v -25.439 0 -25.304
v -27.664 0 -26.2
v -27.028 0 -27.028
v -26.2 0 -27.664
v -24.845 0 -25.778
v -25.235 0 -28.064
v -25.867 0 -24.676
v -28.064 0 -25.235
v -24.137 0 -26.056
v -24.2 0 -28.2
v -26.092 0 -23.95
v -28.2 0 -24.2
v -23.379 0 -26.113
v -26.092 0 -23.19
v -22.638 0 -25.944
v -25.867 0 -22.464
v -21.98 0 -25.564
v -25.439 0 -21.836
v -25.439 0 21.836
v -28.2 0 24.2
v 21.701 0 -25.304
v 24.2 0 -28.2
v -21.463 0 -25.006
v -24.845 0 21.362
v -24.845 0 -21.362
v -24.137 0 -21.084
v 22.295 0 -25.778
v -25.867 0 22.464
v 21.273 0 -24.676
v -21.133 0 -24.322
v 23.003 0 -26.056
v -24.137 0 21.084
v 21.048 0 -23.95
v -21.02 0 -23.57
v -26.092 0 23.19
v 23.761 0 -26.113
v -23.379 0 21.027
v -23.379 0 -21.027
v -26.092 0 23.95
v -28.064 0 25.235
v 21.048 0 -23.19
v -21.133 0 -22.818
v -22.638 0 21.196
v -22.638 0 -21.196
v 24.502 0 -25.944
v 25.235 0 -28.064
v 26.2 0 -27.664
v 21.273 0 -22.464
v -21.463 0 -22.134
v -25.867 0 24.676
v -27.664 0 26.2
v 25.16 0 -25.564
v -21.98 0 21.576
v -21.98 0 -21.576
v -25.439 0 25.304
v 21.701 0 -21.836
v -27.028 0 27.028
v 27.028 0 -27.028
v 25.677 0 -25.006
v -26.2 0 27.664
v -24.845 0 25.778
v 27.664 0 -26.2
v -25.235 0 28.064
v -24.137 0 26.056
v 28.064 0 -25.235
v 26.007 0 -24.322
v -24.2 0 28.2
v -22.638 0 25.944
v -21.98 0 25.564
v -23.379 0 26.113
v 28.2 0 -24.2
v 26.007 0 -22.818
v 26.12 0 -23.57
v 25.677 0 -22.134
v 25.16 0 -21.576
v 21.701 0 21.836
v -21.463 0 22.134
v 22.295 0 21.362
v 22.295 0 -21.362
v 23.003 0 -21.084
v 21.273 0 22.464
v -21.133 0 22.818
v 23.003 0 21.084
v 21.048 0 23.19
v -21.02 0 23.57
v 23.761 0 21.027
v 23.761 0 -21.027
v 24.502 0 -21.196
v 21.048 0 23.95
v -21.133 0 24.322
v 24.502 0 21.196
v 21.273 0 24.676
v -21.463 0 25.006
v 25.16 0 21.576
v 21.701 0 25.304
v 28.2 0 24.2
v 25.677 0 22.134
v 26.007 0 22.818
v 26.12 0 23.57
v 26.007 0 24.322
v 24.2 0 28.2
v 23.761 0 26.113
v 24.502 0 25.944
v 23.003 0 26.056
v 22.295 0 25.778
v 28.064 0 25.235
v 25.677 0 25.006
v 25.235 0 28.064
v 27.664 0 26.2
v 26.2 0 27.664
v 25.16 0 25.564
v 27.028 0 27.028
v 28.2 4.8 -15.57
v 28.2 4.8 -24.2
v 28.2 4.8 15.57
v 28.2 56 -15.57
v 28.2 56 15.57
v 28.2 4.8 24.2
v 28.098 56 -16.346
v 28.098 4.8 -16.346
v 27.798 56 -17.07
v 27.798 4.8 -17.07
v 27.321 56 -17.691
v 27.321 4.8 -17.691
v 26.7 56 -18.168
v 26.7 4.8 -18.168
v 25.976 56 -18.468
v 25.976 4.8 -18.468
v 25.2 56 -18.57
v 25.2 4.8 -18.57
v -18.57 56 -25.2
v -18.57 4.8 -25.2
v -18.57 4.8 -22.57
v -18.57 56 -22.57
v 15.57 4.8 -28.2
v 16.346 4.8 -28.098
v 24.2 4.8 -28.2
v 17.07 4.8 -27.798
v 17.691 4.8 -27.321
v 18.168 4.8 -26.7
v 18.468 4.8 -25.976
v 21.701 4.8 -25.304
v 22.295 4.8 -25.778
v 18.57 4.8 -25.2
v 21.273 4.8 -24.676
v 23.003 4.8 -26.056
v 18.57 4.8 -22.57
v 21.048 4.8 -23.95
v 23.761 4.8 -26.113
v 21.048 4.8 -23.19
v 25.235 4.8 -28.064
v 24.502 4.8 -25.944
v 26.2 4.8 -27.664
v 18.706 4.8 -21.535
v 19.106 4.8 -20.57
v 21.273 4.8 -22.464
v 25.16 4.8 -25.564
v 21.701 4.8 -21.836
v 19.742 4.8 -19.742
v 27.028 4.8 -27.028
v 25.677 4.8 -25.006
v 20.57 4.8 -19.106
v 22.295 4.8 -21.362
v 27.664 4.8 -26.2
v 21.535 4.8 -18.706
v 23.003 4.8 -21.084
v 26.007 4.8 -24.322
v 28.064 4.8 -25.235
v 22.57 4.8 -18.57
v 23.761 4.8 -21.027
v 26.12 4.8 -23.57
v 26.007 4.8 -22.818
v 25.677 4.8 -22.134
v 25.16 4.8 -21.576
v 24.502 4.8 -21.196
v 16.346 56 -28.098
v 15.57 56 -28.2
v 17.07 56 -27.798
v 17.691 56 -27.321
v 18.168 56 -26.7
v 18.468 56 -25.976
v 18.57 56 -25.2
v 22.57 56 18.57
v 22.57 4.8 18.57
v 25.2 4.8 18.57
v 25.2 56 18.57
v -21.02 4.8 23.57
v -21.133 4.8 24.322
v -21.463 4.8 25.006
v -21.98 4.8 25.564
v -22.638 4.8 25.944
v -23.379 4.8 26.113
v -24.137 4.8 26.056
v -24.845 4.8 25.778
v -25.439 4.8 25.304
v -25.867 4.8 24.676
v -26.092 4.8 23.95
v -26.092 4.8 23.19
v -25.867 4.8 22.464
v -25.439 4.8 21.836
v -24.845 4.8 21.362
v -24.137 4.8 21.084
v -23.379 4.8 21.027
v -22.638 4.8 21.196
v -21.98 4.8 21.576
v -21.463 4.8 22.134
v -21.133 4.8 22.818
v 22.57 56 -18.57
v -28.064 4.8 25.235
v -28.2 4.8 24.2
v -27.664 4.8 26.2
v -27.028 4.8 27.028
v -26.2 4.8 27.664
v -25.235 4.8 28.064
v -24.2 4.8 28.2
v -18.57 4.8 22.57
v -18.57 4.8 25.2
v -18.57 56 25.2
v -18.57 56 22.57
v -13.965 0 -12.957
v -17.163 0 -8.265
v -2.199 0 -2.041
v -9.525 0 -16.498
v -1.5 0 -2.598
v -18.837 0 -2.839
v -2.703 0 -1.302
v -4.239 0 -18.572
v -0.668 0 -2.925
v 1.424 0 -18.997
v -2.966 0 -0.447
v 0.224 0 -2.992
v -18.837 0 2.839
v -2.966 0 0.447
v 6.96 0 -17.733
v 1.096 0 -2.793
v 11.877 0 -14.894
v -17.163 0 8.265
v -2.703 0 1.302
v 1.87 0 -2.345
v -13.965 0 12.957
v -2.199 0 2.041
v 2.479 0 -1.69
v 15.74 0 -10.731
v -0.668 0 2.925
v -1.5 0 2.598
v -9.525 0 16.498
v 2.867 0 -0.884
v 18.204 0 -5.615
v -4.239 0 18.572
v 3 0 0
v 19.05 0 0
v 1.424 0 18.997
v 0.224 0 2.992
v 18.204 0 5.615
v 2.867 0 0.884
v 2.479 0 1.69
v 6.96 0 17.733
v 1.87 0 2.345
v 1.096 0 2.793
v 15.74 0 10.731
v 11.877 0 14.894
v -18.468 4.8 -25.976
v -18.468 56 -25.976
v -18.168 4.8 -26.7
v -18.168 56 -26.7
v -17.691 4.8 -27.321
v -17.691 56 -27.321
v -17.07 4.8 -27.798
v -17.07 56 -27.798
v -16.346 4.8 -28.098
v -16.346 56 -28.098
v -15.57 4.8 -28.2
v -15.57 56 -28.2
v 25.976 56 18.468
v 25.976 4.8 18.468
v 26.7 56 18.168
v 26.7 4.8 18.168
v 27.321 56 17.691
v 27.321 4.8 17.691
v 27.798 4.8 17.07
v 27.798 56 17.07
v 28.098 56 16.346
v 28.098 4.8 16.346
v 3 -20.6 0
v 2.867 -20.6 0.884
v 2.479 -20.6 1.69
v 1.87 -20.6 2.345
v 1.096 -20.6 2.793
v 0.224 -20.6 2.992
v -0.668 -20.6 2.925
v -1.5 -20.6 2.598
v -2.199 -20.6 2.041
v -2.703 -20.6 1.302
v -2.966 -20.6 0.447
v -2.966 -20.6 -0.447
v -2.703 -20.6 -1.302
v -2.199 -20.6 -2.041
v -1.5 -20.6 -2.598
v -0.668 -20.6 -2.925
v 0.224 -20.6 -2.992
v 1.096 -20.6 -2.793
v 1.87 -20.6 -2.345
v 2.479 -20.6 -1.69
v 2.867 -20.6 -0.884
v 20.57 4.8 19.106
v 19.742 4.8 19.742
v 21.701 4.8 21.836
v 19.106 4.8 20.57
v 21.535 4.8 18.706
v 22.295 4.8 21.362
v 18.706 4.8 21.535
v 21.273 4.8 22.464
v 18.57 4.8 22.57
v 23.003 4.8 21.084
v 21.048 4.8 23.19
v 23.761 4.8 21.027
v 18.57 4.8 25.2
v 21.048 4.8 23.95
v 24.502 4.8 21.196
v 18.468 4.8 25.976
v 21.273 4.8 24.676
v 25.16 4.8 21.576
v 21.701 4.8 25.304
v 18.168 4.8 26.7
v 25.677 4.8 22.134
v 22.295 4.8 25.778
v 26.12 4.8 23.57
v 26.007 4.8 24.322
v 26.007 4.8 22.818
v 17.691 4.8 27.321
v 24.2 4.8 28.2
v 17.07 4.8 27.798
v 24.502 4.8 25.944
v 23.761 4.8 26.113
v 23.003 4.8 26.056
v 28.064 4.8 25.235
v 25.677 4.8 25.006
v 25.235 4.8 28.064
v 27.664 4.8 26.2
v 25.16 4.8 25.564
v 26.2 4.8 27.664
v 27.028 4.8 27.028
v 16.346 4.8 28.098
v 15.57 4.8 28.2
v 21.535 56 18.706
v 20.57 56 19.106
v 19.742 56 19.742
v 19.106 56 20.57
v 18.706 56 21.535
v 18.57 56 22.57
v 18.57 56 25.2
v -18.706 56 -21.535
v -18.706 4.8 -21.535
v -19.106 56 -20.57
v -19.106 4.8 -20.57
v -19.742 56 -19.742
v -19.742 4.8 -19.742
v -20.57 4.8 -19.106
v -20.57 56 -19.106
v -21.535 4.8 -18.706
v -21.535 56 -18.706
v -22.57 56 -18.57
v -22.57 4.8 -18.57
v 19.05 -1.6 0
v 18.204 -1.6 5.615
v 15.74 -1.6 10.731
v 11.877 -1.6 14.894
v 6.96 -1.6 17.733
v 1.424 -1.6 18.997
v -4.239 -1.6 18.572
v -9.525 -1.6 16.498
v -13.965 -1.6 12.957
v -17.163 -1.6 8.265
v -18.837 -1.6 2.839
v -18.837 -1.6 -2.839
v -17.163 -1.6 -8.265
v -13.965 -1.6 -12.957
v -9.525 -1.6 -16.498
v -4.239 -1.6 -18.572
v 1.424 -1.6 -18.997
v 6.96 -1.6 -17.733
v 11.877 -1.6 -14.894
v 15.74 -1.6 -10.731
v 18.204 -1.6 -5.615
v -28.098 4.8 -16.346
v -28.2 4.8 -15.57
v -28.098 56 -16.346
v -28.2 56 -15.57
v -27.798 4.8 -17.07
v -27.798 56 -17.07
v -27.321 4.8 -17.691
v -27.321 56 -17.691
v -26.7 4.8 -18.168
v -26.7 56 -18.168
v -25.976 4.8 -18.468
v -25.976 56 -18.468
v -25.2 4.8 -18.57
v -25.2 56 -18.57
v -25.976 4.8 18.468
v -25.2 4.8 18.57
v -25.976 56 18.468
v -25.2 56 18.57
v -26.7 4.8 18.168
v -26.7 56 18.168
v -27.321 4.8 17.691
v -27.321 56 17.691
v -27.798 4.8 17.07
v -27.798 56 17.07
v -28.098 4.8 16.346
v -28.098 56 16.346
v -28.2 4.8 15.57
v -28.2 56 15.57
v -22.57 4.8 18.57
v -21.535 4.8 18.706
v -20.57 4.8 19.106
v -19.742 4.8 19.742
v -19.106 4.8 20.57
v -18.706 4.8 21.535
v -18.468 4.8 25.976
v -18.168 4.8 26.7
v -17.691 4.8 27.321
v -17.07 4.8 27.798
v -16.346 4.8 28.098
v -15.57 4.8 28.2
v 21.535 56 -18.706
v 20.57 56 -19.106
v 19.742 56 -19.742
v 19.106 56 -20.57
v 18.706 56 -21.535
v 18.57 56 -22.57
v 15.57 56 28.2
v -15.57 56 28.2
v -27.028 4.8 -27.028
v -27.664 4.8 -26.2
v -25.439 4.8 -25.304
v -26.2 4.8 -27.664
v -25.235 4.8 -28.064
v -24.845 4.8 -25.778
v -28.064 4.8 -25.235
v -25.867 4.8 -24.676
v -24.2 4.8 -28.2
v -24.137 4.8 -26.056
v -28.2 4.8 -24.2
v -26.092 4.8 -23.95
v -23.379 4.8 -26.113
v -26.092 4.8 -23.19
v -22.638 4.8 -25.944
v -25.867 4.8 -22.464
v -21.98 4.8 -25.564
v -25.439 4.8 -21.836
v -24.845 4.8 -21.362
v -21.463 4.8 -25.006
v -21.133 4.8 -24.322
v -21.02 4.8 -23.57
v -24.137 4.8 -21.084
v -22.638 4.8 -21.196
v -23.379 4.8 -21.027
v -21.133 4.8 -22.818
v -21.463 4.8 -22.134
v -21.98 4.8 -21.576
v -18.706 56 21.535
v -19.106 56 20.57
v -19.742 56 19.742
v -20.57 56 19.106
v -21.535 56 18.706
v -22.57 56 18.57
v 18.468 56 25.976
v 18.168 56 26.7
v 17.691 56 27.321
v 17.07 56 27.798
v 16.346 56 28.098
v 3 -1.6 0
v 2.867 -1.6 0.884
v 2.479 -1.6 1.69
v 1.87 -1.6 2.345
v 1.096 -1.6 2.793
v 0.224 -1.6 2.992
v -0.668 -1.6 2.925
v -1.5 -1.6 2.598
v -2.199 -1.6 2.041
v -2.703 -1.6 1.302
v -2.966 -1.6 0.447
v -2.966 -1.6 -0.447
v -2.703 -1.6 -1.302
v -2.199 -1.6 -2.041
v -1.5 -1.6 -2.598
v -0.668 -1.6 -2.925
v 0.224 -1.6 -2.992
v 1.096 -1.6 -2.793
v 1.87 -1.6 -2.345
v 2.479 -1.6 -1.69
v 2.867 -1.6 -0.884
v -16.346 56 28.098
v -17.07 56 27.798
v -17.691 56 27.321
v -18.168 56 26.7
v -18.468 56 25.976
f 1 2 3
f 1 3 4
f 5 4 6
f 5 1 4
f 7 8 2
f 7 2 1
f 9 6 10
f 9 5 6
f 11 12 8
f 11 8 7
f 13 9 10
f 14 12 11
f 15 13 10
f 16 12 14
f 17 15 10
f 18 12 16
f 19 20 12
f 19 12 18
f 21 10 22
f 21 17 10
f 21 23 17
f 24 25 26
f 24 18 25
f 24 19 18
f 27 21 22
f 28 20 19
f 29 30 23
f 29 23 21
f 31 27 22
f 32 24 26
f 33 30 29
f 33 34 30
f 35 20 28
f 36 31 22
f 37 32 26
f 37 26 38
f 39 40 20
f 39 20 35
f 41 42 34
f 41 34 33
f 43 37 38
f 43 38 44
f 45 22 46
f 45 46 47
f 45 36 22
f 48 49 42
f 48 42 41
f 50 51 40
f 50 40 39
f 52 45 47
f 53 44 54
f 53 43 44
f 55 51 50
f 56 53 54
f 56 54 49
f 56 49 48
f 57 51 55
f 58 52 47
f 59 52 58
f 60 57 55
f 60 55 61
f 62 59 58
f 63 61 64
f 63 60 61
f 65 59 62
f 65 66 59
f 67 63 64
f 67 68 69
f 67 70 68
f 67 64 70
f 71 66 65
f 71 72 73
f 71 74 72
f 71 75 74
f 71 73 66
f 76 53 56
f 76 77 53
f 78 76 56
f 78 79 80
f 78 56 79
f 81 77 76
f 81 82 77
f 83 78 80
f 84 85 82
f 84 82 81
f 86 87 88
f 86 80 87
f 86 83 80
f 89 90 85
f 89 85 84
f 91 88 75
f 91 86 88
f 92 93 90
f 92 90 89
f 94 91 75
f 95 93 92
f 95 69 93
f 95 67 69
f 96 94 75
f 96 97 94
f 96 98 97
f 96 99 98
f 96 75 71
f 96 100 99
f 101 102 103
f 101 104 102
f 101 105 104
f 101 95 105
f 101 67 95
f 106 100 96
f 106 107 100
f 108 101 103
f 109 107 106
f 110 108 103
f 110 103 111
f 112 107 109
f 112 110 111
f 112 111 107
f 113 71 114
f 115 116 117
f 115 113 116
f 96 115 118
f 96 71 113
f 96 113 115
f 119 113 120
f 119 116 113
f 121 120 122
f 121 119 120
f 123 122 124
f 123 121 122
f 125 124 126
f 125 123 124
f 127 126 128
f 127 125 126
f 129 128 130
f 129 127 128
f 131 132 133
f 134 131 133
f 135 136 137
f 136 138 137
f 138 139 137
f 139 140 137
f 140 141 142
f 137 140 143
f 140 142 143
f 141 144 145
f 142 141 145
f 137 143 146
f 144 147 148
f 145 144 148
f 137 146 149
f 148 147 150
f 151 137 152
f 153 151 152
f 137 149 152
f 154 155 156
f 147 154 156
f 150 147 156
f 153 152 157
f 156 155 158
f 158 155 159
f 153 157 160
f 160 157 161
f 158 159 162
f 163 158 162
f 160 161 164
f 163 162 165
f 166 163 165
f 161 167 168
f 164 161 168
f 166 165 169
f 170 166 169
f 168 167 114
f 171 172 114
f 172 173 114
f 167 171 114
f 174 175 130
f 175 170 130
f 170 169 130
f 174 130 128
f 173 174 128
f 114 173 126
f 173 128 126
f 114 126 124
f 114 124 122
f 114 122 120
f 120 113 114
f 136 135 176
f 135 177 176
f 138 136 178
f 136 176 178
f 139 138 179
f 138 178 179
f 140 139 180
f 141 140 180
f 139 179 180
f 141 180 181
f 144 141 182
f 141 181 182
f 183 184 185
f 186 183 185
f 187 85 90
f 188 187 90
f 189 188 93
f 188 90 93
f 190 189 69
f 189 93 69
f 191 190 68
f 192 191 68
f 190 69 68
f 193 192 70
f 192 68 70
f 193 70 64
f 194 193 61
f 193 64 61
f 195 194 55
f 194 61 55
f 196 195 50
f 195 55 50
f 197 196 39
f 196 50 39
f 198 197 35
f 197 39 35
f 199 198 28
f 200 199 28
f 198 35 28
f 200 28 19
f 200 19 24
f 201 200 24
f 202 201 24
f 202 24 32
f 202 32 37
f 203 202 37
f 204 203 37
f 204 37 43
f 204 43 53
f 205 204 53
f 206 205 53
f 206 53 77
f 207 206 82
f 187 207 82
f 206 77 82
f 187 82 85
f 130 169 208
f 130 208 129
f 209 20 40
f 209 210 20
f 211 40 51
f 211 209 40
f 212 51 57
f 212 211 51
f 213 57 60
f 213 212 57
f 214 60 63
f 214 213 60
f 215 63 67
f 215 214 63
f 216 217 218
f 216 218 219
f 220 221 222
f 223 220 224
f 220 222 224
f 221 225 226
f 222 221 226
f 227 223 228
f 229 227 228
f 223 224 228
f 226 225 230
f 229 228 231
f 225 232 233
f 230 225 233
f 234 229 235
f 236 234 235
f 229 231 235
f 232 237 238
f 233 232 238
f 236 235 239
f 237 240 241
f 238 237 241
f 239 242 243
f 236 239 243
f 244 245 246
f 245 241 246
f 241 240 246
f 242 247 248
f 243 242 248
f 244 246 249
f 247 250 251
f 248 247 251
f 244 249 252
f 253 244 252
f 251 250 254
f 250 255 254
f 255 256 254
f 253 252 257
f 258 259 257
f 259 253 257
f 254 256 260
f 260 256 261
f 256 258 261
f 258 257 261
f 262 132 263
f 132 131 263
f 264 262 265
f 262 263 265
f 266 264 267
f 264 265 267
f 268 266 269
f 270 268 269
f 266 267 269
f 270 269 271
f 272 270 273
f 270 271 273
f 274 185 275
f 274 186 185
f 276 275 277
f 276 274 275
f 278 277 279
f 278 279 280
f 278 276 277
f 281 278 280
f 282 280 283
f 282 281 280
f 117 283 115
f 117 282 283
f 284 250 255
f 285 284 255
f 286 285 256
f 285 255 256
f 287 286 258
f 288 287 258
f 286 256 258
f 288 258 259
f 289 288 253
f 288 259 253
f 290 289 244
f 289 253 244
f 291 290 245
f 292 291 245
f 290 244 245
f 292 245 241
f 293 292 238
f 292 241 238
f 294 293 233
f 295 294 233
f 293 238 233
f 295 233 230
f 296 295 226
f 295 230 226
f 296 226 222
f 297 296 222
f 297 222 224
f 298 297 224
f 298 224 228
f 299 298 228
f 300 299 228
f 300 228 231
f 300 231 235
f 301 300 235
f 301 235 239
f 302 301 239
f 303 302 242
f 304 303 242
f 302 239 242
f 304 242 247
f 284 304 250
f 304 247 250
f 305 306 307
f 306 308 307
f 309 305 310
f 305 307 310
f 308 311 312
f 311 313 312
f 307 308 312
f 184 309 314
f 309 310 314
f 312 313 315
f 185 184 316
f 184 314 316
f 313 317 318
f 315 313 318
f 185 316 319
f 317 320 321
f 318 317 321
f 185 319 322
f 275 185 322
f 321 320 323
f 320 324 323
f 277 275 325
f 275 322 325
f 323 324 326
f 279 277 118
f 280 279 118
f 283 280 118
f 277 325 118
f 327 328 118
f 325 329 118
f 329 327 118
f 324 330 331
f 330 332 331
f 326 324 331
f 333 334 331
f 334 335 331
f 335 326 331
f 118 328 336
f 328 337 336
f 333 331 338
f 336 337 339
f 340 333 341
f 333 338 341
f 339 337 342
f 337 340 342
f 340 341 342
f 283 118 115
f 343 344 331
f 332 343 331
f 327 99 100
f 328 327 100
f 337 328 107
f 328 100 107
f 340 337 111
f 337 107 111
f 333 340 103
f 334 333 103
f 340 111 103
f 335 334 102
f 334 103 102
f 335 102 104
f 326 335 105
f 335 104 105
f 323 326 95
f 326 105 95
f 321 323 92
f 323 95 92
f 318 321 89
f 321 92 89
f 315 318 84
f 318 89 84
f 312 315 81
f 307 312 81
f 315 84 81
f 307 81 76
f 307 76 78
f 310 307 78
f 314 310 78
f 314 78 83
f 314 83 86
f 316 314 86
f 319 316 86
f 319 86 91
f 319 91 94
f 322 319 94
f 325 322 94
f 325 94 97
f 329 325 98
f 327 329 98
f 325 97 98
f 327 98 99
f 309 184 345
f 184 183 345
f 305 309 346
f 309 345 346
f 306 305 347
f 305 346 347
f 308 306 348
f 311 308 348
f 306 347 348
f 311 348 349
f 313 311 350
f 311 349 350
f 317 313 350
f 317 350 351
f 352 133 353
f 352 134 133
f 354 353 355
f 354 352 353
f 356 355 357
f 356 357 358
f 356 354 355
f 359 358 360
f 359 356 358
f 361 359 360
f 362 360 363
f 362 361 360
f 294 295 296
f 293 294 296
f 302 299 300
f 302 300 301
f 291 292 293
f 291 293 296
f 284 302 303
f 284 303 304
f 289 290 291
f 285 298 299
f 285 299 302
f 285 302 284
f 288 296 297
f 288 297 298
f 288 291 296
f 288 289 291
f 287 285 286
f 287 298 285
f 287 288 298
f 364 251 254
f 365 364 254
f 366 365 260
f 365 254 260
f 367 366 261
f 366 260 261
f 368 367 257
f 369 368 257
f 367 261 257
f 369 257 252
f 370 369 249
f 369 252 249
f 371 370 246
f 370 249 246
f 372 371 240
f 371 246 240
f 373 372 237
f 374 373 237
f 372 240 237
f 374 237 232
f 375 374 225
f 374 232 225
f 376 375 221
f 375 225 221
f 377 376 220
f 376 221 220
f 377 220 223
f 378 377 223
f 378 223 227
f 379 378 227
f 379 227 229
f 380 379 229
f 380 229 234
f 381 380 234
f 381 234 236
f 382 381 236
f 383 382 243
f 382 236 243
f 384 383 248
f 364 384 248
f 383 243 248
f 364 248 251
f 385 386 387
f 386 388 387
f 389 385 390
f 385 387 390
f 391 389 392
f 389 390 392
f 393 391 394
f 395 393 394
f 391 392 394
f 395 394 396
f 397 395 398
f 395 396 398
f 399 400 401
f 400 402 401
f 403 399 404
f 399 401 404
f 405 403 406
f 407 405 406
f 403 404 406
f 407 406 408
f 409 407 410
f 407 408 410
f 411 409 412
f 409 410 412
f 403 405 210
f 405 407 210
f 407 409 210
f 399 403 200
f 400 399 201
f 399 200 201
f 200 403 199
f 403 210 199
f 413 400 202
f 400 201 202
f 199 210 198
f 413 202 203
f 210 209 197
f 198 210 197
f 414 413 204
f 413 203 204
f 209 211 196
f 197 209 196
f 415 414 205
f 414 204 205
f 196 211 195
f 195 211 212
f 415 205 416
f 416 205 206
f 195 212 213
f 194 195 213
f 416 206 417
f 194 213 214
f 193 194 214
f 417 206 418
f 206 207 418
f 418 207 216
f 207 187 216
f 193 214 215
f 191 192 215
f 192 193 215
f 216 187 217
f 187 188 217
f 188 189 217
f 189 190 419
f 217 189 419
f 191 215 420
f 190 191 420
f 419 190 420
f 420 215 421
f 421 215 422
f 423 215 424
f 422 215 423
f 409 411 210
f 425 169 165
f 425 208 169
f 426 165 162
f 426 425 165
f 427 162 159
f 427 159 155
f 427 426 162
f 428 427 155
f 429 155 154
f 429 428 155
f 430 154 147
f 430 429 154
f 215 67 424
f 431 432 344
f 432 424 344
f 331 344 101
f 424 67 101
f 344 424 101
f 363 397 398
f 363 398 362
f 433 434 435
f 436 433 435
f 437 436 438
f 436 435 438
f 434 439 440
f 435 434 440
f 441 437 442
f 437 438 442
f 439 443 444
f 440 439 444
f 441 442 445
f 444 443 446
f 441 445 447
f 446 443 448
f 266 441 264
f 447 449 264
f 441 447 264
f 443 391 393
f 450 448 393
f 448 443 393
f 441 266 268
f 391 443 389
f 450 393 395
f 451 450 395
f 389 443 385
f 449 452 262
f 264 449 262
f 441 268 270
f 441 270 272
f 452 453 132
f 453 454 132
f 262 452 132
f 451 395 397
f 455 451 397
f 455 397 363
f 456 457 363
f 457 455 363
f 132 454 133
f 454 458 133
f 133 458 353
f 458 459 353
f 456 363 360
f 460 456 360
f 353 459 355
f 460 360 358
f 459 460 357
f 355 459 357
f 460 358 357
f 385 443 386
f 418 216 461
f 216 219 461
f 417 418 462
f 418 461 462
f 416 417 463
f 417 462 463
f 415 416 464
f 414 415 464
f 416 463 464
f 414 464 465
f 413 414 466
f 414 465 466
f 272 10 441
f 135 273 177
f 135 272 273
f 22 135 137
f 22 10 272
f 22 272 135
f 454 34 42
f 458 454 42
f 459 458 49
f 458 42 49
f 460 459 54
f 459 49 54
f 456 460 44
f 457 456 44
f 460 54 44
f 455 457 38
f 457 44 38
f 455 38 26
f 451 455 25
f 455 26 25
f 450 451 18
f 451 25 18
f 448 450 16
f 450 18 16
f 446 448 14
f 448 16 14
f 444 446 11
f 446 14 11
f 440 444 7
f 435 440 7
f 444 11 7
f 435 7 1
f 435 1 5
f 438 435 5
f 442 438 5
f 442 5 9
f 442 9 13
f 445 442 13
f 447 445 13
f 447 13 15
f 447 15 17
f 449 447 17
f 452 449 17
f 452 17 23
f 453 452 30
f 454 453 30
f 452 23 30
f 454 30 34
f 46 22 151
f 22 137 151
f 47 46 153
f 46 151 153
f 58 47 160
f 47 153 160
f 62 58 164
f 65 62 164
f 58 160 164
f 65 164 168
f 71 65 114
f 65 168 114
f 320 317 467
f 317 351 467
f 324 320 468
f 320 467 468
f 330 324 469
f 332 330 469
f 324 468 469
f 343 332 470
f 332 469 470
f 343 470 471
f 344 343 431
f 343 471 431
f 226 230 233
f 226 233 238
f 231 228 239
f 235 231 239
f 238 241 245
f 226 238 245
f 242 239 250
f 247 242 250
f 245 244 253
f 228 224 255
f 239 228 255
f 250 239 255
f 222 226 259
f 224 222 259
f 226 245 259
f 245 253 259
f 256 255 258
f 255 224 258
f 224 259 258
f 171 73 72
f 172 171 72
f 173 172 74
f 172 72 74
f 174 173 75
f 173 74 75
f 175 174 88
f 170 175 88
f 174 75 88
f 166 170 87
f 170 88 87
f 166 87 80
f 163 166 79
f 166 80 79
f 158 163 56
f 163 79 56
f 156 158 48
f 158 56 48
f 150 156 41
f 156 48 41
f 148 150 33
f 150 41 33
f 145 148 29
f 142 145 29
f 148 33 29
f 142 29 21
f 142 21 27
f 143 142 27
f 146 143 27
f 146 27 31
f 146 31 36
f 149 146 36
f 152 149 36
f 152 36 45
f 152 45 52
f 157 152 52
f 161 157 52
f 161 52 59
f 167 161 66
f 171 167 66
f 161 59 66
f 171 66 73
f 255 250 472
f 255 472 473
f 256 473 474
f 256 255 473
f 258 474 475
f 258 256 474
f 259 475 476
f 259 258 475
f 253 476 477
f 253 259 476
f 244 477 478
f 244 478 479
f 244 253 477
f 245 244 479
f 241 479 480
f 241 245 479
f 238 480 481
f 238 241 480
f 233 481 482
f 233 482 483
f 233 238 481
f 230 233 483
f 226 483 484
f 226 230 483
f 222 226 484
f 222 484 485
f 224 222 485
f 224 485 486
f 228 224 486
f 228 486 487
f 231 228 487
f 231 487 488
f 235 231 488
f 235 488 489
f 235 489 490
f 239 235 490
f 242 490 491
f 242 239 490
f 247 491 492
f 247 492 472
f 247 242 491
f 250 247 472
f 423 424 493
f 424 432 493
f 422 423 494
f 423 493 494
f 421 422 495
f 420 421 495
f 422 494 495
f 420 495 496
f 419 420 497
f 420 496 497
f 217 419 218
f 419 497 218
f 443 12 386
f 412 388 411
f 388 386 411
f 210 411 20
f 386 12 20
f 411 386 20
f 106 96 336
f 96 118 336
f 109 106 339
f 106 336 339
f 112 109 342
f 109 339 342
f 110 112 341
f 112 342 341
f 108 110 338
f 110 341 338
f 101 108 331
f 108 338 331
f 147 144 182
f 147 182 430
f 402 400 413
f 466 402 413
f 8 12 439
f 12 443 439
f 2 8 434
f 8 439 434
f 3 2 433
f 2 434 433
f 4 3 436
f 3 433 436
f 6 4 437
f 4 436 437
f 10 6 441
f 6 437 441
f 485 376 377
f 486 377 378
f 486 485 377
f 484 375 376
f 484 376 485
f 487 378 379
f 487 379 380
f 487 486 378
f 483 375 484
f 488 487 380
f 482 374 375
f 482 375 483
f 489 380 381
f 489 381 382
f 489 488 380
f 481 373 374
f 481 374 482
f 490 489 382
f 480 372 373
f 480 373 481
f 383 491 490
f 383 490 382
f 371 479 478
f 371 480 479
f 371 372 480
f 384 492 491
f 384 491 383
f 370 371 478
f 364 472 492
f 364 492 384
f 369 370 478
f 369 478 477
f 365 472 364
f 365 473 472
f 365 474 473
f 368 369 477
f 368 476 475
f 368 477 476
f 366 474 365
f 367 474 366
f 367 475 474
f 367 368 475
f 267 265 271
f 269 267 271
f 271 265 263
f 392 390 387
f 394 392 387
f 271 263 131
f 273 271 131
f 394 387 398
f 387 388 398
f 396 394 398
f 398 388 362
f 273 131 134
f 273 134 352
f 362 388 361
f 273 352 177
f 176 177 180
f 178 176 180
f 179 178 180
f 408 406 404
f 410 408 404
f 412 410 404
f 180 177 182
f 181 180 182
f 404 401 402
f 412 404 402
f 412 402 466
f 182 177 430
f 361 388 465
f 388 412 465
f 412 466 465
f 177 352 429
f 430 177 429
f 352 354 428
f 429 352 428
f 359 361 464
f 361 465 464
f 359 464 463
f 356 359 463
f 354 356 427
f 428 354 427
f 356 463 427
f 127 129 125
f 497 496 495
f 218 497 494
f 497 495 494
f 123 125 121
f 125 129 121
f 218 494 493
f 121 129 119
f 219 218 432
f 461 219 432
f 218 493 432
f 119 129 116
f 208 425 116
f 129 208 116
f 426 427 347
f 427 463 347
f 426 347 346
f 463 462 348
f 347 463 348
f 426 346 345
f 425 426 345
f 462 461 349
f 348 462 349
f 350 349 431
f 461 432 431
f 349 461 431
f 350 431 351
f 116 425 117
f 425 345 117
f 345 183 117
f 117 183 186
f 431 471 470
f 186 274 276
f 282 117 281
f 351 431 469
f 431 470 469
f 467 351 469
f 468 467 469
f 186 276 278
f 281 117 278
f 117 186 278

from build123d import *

# Parameters (mm, degrees)
F0_W     = 56.4
F0_H     = 56.4
F0_R     = 2.55
F0_R_2   = 19.05
F0_R_3   = 3
F1_DEPTH = 4.8
F2_DEPTH = 1.6
F3_DEPTH = 20.6
F4_R     = 4
F7_W     = 37.14
F7_H     = 9.63
F7_H_2   = 37.14
F7_W_2   = 9.63
F8_DEPTH = 56
F9_R     = 4
F10_R    = 3


# Not quite as in the source:
# - a feature of the source that left no trace in its solid (it failed there, or was rolled back) is left out


with BuildPart() as f1:
    # F0 (on Front) → F1 (new body)
    with BuildSketch(Plane.XZ):
        Rectangle(F0_W, F0_H)
        with Locations((-23.57, -23.57)):
            Circle(F0_R, mode=Mode.SUBTRACT)
        with Locations((23.57, -23.57)):
            Circle(F0_R, mode=Mode.SUBTRACT)
        with Locations((-23.57, 23.57)):
            Circle(F0_R, mode=Mode.SUBTRACT)
        Circle(F0_R_2, mode=Mode.SUBTRACT)
        with Locations((23.57, 23.57)):
            Circle(F0_R, mode=Mode.SUBTRACT)
        Circle(F0_R_2)
        Circle(F0_R_3, mode=Mode.SUBTRACT)
        Circle(F0_R_3)
    extrude(amount=-F1_DEPTH)

    # F4
    f4_edges = [f1.edges().sort_by_distance(p)[0] for p in [
        (-28.2, 2.4, 28.2),
        (28.2, 2.4, 28.2),
        (28.2, 2.4, -28.2),
        (-28.2, 2.4, -28.2),
    ]]
    fillet(f4_edges, radius=F4_R)

    # F7 (on Front) → F8 (join)
    with BuildSketch(Plane.XZ):
        with Locations((0, 23.385)):
            Rectangle(F7_W, F7_H)
        Rectangle(F7_W, F7_H_2)
        with Locations((-23.385, 0)):
            Rectangle(F7_W_2, F7_H_2)
        with Locations((23.385, 0)):
            Rectangle(F7_W_2, F7_H_2)
        with Locations((0, -23.385)):
            Rectangle(F7_W, F7_H)
    extrude(amount=-F8_DEPTH)

    # F9
    f9_edges = [f1.edges().sort_by_distance(p)[0] for p in [
        (18.57, 30.4, 18.57),
        (-18.57, 30.4, 18.57),
        (-18.57, 30.4, -18.57),
        (18.57, 30.4, -18.57),
    ]]
    fillet(f9_edges, radius=F9_R)

    # F10
    f10_edges = [f1.edges().sort_by_distance(p)[0] for p in [
        (18.57, 30.4, 28.2),
        (28.2, 30.4, 18.57),
        (28.2, 30.4, -18.57),
        (18.57, 30.4, -28.2),
        (-18.57, 30.4, -28.2),
        (-28.2, 30.4, -18.57),
        (-28.2, 30.4, 18.57),
        (-18.57, 30.4, 28.2),
    ]]
    fillet(f10_edges, radius=F10_R)


with BuildPart() as f2:
    # F0 (on Front) → F2 (new body)
    with BuildSketch(Plane.XZ):
        Circle(F0_R_2)
        Circle(F0_R_3, mode=Mode.SUBTRACT)
    extrude(amount=F2_DEPTH)


with BuildPart() as f3:
    # F0 (on Front) → F3 (new body)
    with BuildSketch(Plane.XZ):
        Circle(F0_R_3)
    extrude(amount=F3_DEPTH)


solid = Compound([f1.part, f2.part, f3.part])
